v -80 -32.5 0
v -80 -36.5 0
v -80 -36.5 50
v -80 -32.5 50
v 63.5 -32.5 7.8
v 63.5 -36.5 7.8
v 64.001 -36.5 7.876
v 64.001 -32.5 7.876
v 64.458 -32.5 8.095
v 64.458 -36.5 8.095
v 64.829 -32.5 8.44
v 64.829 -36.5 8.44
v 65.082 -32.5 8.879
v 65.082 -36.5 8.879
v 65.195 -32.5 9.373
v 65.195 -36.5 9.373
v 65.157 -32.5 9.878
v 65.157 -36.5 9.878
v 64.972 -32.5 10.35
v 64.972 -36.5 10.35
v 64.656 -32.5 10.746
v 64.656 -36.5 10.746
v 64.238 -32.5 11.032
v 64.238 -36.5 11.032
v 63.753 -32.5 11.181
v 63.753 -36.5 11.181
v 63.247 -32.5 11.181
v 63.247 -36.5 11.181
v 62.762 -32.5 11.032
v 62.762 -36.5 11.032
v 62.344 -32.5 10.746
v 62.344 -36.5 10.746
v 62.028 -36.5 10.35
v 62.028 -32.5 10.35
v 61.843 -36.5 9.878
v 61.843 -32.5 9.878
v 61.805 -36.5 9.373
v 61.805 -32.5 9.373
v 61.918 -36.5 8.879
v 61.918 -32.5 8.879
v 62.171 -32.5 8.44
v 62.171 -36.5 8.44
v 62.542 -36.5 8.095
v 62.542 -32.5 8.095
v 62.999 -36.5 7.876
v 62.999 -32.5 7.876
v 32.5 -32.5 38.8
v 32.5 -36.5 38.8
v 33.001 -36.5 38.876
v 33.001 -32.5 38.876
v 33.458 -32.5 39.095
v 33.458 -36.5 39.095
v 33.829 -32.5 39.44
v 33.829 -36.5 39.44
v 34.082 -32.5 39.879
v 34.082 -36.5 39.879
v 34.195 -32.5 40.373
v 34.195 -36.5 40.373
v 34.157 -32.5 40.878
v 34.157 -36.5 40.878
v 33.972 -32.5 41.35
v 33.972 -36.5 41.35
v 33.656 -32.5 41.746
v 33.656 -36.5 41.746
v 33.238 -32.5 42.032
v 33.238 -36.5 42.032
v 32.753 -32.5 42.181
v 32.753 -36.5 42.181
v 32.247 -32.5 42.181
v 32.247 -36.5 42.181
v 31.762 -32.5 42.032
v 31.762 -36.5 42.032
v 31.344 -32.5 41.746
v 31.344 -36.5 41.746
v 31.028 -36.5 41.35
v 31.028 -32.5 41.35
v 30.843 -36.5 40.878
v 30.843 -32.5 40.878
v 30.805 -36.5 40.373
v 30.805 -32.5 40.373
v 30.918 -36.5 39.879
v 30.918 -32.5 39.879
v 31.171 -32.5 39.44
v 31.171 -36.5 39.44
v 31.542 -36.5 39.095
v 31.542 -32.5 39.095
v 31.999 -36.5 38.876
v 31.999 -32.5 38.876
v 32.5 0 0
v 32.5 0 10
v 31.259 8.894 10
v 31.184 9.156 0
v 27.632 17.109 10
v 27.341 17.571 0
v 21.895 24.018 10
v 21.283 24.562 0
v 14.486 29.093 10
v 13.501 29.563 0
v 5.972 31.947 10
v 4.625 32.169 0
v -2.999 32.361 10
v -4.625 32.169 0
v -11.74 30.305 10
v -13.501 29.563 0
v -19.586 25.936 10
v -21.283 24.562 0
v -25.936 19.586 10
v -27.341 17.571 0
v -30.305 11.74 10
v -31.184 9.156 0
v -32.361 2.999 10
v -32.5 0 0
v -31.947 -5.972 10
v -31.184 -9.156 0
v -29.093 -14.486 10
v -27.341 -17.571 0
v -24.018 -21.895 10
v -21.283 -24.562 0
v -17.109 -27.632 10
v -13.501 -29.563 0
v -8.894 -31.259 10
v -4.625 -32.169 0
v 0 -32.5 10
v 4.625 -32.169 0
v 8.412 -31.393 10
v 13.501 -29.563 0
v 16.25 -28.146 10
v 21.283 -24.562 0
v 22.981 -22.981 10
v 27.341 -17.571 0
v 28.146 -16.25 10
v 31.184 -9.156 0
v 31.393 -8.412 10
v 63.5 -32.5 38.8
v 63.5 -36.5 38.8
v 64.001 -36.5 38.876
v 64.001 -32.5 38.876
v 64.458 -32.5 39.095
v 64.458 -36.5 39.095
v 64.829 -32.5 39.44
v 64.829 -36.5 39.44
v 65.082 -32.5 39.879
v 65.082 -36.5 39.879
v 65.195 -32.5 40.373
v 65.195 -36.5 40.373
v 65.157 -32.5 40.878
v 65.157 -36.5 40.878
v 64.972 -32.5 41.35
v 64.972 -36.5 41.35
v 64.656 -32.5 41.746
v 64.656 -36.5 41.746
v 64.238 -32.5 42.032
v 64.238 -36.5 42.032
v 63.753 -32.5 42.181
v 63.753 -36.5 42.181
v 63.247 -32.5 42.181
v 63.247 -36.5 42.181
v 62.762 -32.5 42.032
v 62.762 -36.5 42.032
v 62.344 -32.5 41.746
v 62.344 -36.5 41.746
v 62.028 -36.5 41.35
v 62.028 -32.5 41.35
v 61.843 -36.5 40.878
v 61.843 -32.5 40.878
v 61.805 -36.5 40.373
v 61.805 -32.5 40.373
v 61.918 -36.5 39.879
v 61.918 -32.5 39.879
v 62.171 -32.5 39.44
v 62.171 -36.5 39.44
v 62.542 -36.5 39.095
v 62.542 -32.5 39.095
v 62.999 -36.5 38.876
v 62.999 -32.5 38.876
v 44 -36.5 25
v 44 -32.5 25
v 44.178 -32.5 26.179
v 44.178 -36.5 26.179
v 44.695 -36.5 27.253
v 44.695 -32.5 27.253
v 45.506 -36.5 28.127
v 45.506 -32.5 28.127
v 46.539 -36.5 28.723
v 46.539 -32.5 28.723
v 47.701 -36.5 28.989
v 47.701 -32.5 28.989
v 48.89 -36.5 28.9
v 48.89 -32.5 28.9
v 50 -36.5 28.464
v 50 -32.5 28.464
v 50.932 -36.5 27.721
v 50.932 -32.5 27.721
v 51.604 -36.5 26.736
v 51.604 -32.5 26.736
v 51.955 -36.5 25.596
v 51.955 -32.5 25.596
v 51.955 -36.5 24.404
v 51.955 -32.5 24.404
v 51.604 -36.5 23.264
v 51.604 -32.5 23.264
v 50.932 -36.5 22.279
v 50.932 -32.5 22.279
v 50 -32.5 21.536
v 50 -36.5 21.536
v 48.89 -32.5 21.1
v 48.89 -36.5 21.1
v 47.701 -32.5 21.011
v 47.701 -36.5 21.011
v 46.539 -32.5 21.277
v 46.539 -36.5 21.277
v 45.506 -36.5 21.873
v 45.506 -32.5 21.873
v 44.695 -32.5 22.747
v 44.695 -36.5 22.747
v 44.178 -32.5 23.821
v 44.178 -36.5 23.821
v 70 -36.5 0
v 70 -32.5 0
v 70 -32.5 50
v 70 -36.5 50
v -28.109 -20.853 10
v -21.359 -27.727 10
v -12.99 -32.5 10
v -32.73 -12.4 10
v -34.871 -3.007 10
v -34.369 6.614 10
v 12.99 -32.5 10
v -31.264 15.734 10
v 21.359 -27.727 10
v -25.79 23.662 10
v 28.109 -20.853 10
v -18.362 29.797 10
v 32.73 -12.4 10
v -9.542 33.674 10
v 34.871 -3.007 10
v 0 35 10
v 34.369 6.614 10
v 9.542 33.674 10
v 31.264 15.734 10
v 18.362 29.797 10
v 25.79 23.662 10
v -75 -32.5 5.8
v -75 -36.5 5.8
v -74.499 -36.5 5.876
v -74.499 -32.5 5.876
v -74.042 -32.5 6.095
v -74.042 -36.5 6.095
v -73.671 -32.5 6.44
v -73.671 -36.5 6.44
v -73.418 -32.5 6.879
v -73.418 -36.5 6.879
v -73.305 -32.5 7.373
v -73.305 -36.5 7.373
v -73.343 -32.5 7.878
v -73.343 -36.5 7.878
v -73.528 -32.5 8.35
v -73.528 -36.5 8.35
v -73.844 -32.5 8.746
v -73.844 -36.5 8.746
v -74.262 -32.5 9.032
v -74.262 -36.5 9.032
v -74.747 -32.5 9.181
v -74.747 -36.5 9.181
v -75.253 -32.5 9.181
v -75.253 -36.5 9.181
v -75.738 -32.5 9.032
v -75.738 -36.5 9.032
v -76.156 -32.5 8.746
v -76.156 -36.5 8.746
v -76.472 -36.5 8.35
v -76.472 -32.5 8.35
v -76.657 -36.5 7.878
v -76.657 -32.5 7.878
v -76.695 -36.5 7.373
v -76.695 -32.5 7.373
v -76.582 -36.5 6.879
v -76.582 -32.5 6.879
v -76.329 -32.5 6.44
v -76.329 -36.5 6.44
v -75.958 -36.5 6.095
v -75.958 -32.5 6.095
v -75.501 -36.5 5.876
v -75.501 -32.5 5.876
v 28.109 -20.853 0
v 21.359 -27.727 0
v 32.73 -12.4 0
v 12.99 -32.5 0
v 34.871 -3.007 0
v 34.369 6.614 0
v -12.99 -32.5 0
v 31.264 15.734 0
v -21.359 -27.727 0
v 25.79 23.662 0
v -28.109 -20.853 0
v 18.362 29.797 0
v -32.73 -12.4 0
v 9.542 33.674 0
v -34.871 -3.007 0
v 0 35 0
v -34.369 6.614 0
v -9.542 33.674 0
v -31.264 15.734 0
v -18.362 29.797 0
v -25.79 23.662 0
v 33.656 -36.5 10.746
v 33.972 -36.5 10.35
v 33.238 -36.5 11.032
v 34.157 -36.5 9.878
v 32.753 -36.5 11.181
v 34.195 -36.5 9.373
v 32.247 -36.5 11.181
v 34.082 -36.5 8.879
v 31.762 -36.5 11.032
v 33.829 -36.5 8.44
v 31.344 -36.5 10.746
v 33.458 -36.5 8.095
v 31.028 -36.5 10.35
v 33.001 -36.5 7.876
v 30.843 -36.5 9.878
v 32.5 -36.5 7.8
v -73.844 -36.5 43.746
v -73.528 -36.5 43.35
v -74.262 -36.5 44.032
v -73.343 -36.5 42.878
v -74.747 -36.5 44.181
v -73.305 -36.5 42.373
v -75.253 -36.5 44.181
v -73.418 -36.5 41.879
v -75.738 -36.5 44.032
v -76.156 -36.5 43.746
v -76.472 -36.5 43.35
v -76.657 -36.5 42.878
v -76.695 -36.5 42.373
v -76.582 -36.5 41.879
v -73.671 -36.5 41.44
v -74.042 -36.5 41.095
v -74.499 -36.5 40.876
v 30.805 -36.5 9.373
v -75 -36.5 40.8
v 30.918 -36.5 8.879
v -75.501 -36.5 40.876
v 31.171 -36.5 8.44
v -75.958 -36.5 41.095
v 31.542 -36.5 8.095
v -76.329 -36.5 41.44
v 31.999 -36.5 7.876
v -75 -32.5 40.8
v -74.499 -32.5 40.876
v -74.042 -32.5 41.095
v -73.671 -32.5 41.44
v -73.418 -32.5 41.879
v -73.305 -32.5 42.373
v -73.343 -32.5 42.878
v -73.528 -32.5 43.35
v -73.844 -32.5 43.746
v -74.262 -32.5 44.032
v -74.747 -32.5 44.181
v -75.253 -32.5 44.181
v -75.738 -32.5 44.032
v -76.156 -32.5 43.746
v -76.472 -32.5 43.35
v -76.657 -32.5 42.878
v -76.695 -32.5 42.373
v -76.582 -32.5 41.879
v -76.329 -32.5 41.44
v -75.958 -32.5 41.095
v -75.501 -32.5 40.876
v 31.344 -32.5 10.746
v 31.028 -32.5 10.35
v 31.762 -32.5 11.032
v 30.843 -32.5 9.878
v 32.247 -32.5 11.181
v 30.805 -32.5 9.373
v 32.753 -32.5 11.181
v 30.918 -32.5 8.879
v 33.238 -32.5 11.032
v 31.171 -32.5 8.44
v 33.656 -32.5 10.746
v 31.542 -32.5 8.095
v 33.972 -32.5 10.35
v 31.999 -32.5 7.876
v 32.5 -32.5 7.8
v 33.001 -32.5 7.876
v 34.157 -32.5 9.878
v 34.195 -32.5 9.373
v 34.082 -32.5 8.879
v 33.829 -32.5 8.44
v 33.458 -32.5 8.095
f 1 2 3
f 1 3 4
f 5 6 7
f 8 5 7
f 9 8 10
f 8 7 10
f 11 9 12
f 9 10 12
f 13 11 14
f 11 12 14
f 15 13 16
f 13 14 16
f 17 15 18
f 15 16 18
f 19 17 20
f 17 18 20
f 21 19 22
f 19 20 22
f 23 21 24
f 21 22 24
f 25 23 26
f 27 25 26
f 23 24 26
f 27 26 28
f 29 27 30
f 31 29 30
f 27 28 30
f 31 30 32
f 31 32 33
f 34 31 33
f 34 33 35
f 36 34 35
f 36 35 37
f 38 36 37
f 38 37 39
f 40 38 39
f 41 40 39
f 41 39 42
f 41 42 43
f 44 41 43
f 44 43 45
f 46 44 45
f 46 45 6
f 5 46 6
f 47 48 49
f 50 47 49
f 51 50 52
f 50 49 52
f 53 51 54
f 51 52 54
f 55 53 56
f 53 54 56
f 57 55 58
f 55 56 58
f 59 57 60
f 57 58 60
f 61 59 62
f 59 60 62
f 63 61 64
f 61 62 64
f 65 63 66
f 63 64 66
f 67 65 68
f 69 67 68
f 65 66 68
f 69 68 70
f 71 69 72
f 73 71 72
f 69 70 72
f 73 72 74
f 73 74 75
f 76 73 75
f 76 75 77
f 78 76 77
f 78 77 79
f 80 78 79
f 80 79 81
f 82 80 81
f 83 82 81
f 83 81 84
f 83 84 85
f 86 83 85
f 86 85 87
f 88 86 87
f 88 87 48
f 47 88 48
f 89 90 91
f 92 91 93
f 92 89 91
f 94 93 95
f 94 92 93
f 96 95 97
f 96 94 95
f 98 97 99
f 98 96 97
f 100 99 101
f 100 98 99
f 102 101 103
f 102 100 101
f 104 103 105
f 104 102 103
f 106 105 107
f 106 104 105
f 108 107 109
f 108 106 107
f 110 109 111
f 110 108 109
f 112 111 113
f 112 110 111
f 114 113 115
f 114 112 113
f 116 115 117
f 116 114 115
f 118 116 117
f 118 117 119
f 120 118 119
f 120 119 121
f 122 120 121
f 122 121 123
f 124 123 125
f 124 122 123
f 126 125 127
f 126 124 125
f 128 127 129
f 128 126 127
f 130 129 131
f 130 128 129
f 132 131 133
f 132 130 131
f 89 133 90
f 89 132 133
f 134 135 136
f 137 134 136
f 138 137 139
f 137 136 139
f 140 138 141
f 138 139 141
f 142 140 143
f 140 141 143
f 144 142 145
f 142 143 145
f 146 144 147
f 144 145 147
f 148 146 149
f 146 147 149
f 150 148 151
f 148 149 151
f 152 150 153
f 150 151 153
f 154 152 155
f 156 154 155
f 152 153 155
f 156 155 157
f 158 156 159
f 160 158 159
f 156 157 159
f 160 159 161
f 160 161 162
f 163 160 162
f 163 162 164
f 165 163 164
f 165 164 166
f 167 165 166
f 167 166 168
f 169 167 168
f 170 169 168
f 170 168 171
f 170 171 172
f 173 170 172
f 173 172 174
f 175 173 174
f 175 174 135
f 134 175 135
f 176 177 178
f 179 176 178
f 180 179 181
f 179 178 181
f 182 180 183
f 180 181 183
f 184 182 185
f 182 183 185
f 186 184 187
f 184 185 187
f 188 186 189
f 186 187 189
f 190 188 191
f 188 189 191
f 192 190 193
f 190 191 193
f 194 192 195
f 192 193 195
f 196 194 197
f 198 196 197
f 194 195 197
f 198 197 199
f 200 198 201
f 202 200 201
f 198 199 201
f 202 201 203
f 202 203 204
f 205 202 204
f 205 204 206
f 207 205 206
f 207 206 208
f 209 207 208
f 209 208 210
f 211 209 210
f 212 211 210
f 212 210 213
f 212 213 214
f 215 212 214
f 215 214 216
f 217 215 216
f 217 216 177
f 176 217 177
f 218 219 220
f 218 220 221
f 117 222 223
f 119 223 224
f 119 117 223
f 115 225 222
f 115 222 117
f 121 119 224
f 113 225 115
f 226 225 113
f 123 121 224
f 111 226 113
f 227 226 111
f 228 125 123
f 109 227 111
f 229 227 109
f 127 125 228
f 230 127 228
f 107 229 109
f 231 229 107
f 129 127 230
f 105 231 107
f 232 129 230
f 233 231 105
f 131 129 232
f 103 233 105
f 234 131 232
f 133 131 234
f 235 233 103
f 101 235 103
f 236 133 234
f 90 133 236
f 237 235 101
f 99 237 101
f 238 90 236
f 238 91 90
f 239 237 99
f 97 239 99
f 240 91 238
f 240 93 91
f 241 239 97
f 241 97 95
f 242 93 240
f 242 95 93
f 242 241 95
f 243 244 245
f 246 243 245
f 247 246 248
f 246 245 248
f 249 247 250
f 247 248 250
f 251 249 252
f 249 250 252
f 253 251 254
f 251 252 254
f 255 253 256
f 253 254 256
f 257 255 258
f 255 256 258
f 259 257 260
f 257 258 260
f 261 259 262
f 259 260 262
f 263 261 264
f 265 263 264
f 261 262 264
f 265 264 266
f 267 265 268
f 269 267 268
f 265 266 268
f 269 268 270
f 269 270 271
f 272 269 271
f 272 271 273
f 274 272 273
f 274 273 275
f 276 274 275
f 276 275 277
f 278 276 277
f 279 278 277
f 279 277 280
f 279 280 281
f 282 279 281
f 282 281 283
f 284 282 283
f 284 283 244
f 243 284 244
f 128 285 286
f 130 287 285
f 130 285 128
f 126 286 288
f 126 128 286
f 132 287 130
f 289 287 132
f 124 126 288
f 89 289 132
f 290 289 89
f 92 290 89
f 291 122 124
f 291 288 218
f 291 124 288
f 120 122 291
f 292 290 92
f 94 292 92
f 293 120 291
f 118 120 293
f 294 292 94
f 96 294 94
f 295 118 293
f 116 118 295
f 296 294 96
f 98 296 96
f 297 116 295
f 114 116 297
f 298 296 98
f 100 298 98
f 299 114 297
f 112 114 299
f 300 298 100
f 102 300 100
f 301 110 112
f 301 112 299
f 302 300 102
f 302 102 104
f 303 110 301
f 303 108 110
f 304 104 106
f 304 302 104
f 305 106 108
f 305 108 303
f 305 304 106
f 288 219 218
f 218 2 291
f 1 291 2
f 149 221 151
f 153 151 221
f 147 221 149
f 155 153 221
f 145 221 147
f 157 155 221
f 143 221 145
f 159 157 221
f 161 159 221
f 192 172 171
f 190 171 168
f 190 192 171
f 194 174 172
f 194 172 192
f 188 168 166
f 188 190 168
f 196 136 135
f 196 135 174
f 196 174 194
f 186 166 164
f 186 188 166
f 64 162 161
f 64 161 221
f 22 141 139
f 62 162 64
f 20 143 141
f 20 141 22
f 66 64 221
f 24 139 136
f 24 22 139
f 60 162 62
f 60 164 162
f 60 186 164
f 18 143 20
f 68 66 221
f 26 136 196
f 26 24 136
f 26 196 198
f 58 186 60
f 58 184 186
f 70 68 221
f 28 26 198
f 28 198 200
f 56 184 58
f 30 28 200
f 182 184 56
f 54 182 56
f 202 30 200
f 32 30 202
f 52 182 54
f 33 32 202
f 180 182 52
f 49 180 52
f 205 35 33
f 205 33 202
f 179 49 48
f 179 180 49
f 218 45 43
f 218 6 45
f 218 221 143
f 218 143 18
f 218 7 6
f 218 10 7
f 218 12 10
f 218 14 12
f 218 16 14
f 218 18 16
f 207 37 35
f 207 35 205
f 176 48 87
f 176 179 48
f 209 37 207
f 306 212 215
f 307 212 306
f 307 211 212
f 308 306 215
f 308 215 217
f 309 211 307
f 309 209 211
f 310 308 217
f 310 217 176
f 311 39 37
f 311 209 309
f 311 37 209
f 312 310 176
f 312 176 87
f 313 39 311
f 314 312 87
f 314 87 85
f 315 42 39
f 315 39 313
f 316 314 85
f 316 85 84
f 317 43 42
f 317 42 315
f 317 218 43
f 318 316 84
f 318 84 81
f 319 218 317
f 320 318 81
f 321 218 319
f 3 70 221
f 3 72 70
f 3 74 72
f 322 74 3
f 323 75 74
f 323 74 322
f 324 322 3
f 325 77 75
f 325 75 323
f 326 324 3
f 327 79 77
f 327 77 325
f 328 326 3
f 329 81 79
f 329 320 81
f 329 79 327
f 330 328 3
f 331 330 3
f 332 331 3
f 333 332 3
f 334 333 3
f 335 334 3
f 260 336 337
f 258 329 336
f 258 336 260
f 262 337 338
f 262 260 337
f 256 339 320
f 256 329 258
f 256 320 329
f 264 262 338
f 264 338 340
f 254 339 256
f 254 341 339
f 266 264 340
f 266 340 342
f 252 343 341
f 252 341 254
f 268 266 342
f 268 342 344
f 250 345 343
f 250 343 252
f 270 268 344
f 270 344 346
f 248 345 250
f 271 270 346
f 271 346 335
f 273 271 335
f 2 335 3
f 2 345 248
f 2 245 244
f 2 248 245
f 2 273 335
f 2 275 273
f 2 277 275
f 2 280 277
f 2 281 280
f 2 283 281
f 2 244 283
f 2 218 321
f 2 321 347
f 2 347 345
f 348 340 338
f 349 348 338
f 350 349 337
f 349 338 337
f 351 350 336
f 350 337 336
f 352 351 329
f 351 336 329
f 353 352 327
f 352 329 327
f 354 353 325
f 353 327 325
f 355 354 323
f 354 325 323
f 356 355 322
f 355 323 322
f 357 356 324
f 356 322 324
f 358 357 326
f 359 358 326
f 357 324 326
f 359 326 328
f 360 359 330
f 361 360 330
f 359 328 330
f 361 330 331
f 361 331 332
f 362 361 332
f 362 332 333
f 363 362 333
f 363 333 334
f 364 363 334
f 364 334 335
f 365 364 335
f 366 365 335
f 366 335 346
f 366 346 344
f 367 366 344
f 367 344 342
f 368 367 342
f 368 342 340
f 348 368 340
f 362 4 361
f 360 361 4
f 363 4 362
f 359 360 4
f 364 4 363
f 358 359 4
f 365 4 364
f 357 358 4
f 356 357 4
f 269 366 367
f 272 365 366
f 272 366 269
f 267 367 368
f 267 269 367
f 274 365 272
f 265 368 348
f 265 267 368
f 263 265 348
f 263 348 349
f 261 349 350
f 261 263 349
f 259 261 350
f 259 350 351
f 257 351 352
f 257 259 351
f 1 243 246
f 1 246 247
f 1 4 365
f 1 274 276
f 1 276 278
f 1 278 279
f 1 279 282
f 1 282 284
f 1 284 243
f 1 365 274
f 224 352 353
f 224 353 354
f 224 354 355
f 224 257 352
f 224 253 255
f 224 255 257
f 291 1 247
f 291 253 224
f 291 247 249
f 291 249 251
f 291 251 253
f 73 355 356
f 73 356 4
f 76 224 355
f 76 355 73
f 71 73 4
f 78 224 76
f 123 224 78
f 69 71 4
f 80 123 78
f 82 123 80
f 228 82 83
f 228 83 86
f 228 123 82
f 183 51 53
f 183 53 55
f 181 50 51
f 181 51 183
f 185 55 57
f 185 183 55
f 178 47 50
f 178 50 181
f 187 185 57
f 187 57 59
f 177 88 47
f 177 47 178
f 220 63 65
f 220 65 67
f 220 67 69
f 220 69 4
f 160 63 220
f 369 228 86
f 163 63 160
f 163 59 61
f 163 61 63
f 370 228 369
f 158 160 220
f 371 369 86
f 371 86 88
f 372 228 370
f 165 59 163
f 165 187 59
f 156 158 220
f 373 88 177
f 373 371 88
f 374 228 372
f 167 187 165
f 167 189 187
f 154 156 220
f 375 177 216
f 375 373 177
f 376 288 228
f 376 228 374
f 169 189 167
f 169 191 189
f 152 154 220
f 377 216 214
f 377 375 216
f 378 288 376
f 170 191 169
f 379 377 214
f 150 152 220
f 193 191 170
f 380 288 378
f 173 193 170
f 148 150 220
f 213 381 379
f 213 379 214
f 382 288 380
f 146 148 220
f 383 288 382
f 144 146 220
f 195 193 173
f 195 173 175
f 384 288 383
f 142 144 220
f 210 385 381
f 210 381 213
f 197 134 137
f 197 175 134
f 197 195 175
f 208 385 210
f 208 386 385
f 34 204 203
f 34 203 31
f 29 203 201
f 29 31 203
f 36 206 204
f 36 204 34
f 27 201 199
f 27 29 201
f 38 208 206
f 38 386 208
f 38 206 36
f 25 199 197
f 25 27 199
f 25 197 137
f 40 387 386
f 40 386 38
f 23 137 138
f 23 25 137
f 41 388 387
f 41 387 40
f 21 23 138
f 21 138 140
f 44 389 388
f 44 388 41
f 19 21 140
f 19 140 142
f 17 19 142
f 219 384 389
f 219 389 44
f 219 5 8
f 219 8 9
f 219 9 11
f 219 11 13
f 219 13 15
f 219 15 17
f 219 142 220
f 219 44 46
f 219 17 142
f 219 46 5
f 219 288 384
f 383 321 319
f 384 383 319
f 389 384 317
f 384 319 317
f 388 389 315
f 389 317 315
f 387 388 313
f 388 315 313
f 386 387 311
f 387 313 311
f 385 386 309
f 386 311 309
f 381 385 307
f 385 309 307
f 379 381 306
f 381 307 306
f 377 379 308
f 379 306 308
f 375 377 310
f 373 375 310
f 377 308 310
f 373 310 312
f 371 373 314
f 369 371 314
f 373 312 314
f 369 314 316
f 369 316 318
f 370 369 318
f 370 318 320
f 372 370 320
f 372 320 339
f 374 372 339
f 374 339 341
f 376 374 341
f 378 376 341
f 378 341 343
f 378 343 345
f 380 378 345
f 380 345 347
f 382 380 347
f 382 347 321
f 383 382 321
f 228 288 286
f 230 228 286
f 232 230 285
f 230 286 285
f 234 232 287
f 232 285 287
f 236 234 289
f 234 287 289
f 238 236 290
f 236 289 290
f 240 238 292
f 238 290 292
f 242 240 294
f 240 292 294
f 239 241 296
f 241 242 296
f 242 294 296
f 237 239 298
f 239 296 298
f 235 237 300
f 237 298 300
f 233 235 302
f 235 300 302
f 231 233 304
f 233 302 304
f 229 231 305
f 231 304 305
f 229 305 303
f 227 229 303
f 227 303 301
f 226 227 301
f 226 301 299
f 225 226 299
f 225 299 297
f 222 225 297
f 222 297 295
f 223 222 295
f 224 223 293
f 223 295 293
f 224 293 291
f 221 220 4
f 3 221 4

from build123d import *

# Parameters (mm, degrees)
SKETCH_1_R          = 35
SKETCH_1_R_2        = 32.5
EXTRUDE_1_DEPTH     = 10
EXTRUDE_2_DEPTH     = 50
CUT_EXTRUDE_1_REACH = 118.001
SKETCH_3_R          = 4
CUT_EXTRUDE_2_REACH = 120.373
SKETCH_4_R          = 1.7
CUT_EXTRUDE_3_REACH = 120.373
SKETCH_5_R          = 1.7


with BuildPart() as part:
    # ｽｹｯﾁ1 → ﾎﾞｽ - 押し出し1 (new body)
    with BuildSketch(Plane.XY):
        Circle(SKETCH_1_R)
        Circle(SKETCH_1_R_2, mode=Mode.SUBTRACT)
    extrude(amount=EXTRUDE_1_DEPTH)

    # ｽｹｯﾁ2 → ﾎﾞｽ - 押し出し2 (add)
    with BuildSketch(Plane(origin=(0, 0, 0), x_dir=(-1, 0, 0), z_dir=(0, 0, -1))):
        Polygon((0, -32.5), (-70, -32.5), (-70, -36.5), (80, -36.5), (80, -32.5), align=None)
    extrude(amount=-EXTRUDE_2_DEPTH)

    # ｽｹｯﾁ3 → ｶｯﾄ - 押し出し1 (cut, up to next)
    with BuildSketch(Plane(origin=(0, -32.5, 0), x_dir=(1, 0, 0), z_dir=(0, 1, 0)), mode=Mode.PRIVATE) as cut_extrude_1_sk1:
        with Locations(Location((48, -25, 0), (0, 0, 180))):
            Circle(SKETCH_3_R)
    cut_extrude_1_tool1 = extrude(cut_extrude_1_sk1.sketch, amount=-CUT_EXTRUDE_1_REACH, mode=Mode.PRIVATE) & part.part
    add(cut_extrude_1_tool1.solids().sort_by_distance((48, -32.5, 25))[0], mode=Mode.SUBTRACT)

    # ｽｹｯﾁ4 → ｶｯﾄ - 押し出し2 (cut, up to next)
    with BuildSketch(Plane.XZ.offset(36.5), mode=Mode.PRIVATE) as cut_extrude_2_sk1:
        with Locations(Location((63.5, 40.5, 0), (0, 0, 270))):
            Circle(SKETCH_4_R)
    cut_extrude_2_tool1 = extrude(cut_extrude_2_sk1.sketch, amount=-CUT_EXTRUDE_2_REACH, mode=Mode.PRIVATE) & part.part
    # ｽｹｯﾁ4 → ｶｯﾄ - 押し出し2 (cut, up to next)
    with BuildSketch(Plane.XZ.offset(36.5), mode=Mode.PRIVATE) as cut_extrude_2_sk2:
        with Locations(Location((63.5, 9.5, 0), (0, 0, 270))):
            Circle(SKETCH_4_R)
    cut_extrude_2_tool2 = extrude(cut_extrude_2_sk2.sketch, amount=-CUT_EXTRUDE_2_REACH, mode=Mode.PRIVATE) & part.part
    # ｽｹｯﾁ4 → ｶｯﾄ - 押し出し2 (cut, up to next)
    with BuildSketch(Plane.XZ.offset(36.5), mode=Mode.PRIVATE) as cut_extrude_2_sk3:
        with Locations(Location((32.5, 40.5, 0), (0, 0, 270))):
            Circle(SKETCH_4_R)
    cut_extrude_2_tool3 = extrude(cut_extrude_2_sk3.sketch, amount=-CUT_EXTRUDE_2_REACH, mode=Mode.PRIVATE) & part.part
    # ｽｹｯﾁ4 → ｶｯﾄ - 押し出し2 (cut, up to next)
    with BuildSketch(Plane.XZ.offset(36.5), mode=Mode.PRIVATE) as cut_extrude_2_sk4:
        with Locations(Location((32.5, 9.5, 0), (0, 0, 270))):
            Circle(SKETCH_4_R)
    cut_extrude_2_tool4 = extrude(cut_extrude_2_sk4.sketch, amount=-CUT_EXTRUDE_2_REACH, mode=Mode.PRIVATE) & part.part
    add(cut_extrude_2_tool1.solids().sort_by_distance((63.5, -36.5, 40.5))[0], mode=Mode.SUBTRACT)
    add(cut_extrude_2_tool2.solids().sort_by_distance((63.5, -36.5, 9.5))[0], mode=Mode.SUBTRACT)
    add(cut_extrude_2_tool3.solids().sort_by_distance((32.5, -36.5, 40.5))[0], mode=Mode.SUBTRACT)
    add(cut_extrude_2_tool4.solids().sort_by_distance((32.5, -36.5, 9.5))[0], mode=Mode.SUBTRACT)

    # ｽｹｯﾁ5 → ｶｯﾄ - 押し出し3 (cut, up to next)
    with BuildSketch(Plane.XZ.offset(36.5), mode=Mode.PRIVATE) as cut_extrude_3_sk1:
        with Locations(Location((-75, 42.5, 0), (0, 0, 270))):
            Circle(SKETCH_5_R)
    cut_extrude_3_tool1 = extrude(cut_extrude_3_sk1.sketch, amount=-CUT_EXTRUDE_3_REACH, mode=Mode.PRIVATE) & part.part
    # ｽｹｯﾁ5 → ｶｯﾄ - 押し出し3 (cut, up to next)
    with BuildSketch(Plane.XZ.offset(36.5), mode=Mode.PRIVATE) as cut_extrude_3_sk2:
        with Locations(Location((-75, 7.5, 0), (0, 0, 270))):
            Circle(SKETCH_5_R)
    cut_extrude_3_tool2 = extrude(cut_extrude_3_sk2.sketch, amount=-CUT_EXTRUDE_3_REACH, mode=Mode.PRIVATE) & part.part
    add(cut_extrude_3_tool1.solids().sort_by_distance((-75, -36.5, 42.5))[0], mode=Mode.SUBTRACT)
    add(cut_extrude_3_tool2.solids().sort_by_distance((-75, -36.5, 7.5))[0], mode=Mode.SUBTRACT)


solid = part.part
